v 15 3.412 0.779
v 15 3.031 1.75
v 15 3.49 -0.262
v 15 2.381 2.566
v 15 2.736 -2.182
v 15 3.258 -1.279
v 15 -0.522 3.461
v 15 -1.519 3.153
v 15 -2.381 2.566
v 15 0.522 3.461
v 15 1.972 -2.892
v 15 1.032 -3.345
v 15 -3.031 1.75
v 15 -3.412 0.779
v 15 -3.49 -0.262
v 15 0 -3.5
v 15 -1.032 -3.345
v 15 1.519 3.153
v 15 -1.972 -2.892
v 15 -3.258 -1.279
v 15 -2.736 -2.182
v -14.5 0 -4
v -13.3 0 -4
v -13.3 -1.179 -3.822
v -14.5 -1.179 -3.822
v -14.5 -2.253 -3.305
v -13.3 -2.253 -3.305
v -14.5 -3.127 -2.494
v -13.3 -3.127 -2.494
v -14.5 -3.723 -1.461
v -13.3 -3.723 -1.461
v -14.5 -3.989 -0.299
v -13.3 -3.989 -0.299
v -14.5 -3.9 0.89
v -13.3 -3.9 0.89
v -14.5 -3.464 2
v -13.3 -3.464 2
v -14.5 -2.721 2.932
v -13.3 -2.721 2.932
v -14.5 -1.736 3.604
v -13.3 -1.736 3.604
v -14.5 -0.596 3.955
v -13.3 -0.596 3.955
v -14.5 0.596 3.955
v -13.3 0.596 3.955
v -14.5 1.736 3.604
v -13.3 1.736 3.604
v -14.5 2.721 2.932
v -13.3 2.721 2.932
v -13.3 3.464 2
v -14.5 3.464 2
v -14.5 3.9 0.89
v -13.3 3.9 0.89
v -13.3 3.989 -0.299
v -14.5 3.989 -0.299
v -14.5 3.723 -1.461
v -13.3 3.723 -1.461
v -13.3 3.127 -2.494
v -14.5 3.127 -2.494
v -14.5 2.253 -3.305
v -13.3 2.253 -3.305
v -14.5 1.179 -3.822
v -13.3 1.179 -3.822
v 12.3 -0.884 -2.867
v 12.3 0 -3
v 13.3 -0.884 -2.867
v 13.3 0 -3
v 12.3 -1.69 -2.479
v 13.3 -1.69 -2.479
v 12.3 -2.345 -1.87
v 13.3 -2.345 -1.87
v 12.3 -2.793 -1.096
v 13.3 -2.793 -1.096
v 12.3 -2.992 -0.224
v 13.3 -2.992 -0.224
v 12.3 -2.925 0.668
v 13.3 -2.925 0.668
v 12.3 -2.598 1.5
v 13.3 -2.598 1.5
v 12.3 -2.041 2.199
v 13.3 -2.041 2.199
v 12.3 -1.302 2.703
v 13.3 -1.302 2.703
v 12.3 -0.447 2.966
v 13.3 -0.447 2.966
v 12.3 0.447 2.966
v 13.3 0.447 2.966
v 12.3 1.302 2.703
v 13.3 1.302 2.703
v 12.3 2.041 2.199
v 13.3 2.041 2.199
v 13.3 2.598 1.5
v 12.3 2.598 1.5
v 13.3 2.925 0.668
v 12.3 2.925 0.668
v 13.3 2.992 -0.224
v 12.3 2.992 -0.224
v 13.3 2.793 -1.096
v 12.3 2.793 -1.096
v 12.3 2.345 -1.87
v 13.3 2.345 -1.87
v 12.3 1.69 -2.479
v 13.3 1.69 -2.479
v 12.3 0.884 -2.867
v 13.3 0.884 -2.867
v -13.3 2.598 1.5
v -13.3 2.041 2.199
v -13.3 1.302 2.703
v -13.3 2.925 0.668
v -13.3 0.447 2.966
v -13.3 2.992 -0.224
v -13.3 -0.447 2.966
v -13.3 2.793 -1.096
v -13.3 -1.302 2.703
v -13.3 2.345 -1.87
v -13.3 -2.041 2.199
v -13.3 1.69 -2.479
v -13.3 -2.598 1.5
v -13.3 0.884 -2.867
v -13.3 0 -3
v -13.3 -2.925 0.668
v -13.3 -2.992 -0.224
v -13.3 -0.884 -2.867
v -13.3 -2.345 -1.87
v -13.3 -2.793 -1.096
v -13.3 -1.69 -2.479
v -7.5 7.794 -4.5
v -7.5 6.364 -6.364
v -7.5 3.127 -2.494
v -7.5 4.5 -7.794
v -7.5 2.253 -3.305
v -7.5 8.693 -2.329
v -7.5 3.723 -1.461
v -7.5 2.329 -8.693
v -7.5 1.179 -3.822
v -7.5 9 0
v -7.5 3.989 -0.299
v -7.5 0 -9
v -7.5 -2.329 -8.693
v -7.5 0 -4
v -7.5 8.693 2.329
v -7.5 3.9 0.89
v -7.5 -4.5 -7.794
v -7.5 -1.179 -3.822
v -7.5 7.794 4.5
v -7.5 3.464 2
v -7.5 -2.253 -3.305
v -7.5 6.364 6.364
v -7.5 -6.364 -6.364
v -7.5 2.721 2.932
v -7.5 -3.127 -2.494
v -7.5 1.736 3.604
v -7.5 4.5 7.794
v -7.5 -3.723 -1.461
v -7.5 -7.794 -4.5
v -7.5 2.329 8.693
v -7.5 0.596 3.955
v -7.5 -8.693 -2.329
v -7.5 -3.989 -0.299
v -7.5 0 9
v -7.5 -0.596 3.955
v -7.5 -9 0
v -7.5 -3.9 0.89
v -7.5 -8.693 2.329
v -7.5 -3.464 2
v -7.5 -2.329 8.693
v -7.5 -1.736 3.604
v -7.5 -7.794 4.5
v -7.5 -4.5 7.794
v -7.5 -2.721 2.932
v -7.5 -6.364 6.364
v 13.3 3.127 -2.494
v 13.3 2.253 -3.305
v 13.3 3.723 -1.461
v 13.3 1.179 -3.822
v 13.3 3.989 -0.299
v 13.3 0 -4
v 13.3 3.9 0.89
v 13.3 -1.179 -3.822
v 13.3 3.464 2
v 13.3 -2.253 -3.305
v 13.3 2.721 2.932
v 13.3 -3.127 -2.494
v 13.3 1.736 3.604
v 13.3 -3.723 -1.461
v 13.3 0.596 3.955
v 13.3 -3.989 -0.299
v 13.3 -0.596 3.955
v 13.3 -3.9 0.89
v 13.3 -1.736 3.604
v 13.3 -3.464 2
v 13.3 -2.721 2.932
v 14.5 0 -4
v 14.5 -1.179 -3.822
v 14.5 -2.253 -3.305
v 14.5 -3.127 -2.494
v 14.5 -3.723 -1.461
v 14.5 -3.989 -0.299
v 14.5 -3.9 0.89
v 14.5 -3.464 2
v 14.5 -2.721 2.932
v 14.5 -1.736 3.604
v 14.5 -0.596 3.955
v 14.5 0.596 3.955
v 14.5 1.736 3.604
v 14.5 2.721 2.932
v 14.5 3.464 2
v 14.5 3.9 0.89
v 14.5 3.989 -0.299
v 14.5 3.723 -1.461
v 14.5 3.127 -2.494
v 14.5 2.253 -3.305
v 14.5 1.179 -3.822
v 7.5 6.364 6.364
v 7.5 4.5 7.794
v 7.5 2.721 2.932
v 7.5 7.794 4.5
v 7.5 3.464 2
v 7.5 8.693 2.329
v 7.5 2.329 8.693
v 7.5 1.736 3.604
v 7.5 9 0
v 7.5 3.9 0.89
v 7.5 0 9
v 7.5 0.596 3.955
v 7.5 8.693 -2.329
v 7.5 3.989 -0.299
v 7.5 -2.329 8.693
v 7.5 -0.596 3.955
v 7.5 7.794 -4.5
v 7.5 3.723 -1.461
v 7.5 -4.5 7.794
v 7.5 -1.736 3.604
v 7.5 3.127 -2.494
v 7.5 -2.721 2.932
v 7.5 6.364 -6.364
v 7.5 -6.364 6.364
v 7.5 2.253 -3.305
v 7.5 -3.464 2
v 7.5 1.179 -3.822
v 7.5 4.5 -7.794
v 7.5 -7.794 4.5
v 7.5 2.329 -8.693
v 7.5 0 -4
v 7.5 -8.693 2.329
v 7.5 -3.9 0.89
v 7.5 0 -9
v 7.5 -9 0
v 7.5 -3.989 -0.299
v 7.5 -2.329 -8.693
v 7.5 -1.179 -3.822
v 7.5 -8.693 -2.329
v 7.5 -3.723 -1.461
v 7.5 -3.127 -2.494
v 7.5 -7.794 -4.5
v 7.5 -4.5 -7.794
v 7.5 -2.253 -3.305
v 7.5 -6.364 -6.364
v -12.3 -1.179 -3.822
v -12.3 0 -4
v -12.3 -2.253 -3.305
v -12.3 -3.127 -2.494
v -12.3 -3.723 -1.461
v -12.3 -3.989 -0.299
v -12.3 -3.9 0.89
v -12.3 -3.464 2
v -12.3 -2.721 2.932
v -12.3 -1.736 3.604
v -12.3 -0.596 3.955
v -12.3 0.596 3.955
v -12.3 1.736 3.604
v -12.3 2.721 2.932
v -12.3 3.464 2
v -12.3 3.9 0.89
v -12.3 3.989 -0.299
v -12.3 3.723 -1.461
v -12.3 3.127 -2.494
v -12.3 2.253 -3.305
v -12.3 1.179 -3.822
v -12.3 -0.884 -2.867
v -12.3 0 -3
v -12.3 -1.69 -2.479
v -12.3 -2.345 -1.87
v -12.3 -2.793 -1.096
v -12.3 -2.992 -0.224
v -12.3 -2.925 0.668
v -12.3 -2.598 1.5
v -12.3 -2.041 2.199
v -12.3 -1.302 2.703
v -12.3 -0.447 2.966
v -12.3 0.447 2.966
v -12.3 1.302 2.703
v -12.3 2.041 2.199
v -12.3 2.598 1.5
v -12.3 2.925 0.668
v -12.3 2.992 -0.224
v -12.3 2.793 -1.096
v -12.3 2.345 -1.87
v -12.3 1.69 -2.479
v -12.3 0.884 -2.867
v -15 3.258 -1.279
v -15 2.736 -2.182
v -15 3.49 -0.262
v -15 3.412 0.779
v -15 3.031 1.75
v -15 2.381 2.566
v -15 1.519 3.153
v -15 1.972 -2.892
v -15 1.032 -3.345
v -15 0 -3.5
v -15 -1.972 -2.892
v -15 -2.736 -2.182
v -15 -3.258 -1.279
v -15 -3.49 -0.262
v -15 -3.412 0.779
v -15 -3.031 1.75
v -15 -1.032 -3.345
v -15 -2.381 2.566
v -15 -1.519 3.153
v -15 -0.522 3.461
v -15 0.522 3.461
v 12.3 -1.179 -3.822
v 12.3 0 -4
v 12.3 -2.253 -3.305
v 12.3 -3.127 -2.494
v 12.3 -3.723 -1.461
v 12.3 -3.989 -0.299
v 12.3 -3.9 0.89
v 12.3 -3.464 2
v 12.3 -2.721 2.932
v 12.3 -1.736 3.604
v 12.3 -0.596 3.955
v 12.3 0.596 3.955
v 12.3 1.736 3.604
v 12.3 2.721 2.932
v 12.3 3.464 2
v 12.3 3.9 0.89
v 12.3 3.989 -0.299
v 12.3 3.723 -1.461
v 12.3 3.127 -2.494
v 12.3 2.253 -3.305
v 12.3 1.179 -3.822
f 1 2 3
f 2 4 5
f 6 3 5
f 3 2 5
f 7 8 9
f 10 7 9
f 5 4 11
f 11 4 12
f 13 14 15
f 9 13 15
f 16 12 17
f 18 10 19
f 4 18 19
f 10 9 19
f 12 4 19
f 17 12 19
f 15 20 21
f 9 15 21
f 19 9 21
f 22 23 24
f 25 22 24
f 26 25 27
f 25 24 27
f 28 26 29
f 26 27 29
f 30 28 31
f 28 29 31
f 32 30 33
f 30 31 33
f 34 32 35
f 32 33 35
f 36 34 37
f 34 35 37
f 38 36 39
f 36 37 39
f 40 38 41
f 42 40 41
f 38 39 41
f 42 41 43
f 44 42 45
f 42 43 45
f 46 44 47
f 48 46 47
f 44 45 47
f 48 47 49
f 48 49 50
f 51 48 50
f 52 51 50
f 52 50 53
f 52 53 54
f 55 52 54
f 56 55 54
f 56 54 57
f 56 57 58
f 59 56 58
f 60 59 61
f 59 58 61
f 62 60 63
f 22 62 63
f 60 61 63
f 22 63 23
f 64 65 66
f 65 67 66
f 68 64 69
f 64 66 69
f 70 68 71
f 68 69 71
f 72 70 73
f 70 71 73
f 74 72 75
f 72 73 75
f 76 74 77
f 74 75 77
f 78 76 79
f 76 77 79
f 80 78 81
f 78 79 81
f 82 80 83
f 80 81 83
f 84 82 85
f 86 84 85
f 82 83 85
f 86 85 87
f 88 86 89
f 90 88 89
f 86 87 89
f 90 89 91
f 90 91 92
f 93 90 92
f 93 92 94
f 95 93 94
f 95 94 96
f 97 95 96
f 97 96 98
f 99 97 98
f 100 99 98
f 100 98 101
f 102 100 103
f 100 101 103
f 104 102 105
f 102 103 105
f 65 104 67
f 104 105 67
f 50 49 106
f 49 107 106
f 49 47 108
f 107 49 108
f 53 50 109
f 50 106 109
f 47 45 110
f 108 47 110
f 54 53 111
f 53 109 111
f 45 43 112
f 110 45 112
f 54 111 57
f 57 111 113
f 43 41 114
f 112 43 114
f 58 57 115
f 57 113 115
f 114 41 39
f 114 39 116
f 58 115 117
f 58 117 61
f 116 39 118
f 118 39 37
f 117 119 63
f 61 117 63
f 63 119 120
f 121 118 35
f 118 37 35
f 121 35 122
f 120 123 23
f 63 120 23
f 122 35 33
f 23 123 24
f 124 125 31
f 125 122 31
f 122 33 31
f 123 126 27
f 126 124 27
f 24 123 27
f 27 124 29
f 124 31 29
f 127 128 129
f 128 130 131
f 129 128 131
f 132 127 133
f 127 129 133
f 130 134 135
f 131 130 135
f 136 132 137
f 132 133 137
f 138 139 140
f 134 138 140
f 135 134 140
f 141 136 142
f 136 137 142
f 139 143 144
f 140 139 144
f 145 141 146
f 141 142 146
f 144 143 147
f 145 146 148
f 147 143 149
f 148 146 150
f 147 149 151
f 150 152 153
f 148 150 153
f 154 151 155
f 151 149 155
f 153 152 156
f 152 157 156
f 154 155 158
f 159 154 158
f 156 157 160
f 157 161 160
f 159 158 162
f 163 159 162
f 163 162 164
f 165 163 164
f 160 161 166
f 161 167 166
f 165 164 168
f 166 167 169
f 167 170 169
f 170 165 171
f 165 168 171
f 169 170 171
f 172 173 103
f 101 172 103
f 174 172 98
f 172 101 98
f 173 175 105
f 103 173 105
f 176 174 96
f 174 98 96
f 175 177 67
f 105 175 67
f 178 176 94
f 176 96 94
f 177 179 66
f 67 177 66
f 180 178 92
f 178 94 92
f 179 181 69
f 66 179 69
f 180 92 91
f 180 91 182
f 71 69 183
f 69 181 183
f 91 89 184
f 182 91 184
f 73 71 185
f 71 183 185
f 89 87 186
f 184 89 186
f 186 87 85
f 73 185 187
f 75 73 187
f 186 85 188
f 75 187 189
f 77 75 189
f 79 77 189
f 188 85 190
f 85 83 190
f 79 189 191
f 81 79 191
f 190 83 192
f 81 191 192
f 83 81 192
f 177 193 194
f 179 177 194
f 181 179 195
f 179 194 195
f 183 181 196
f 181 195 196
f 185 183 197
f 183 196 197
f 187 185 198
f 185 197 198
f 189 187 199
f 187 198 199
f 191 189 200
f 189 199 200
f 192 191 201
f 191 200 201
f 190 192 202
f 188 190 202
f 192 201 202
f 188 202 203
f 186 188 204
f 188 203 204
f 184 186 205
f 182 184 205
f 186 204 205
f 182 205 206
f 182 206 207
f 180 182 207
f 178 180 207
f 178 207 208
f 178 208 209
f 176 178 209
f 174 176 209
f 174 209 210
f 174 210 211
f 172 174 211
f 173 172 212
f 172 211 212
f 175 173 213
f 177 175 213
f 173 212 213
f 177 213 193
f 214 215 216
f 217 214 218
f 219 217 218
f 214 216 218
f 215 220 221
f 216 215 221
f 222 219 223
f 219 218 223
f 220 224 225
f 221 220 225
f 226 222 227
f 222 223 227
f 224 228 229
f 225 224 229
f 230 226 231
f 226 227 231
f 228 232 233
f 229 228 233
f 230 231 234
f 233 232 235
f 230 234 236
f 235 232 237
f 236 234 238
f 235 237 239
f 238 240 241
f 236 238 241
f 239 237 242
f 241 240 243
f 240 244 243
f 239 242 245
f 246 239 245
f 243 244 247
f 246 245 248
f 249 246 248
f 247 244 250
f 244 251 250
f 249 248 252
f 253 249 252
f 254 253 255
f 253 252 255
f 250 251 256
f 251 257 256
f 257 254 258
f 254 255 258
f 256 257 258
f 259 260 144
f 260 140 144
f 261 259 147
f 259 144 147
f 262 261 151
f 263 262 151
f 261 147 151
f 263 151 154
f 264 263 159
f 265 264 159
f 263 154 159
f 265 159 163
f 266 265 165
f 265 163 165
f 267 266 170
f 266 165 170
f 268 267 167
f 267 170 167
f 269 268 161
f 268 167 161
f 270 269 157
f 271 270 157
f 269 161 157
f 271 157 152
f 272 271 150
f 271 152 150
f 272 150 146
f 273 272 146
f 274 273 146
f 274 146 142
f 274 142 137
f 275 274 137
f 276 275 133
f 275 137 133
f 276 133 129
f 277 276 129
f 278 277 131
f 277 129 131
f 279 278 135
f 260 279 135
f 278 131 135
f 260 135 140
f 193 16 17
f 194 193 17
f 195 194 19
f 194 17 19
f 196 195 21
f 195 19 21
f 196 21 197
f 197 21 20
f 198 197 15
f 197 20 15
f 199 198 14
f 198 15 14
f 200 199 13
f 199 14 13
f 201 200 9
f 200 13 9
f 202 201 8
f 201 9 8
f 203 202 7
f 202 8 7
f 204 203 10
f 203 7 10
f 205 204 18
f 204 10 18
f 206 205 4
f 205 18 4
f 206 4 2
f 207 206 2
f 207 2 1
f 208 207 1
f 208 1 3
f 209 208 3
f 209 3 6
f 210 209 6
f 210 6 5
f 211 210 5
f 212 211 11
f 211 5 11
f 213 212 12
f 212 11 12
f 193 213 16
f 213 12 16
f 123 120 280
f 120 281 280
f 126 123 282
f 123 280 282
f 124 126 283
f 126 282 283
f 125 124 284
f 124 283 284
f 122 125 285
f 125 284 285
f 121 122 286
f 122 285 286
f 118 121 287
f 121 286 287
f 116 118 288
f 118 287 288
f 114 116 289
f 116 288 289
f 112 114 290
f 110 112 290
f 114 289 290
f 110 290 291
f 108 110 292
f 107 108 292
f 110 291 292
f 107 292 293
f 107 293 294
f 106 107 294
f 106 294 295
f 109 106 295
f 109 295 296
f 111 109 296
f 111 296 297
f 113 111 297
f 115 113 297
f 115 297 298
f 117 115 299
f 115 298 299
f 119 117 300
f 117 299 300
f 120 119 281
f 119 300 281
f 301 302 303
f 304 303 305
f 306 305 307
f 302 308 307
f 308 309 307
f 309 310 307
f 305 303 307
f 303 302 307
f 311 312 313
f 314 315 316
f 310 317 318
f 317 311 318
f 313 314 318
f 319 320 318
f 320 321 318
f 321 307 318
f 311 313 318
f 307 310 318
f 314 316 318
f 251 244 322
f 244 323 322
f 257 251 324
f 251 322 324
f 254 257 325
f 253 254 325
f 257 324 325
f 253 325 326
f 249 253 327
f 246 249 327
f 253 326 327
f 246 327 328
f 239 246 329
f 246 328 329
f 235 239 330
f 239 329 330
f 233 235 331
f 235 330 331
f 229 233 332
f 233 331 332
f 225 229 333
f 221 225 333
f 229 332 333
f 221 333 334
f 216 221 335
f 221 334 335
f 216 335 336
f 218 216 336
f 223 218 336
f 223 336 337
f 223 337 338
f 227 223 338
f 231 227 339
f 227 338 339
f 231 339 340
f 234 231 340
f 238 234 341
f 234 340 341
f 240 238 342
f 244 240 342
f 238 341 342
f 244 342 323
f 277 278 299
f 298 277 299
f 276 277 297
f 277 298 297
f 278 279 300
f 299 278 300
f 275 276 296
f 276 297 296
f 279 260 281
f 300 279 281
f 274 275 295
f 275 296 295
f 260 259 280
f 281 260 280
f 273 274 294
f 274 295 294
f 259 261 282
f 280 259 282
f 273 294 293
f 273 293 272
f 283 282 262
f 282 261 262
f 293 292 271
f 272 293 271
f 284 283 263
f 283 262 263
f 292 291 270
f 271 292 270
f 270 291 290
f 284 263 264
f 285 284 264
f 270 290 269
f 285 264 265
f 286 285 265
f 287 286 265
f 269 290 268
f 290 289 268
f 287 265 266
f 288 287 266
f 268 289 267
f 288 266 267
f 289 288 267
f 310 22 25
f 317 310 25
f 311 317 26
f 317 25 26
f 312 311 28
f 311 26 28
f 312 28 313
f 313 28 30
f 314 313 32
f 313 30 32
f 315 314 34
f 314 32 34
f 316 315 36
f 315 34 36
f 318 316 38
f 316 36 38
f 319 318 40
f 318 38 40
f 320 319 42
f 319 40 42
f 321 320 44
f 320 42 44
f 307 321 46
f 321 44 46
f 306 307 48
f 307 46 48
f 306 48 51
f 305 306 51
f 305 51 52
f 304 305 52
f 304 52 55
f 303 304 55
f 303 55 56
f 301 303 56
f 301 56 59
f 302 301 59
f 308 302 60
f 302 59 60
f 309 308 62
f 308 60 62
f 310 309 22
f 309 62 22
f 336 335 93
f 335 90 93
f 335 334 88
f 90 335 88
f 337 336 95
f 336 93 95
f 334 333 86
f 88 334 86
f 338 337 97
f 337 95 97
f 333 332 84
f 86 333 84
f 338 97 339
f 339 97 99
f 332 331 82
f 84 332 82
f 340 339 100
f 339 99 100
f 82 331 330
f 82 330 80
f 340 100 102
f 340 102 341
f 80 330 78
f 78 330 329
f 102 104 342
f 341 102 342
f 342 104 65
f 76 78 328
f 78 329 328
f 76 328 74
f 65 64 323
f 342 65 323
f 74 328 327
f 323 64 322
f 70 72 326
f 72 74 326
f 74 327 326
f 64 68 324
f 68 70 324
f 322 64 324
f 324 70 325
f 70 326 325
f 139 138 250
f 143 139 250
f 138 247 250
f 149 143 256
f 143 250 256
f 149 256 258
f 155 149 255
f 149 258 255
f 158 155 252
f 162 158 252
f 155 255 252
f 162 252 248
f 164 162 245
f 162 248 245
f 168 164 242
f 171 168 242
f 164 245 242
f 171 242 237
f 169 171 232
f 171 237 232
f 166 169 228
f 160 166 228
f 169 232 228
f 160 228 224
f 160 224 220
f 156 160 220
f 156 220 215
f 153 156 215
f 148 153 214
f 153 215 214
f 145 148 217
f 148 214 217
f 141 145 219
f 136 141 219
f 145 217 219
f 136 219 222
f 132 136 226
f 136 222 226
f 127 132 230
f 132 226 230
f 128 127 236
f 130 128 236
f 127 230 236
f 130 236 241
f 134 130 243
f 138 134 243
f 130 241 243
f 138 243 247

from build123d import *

# Parameters (mm, degrees)
F2_SIZE2 = 0.5
F2_SIZE  = 0.5


with BuildPart() as f1:
    # F0 (on Front) → F1 (revolve)
    with BuildSketch(Plane.XZ):
        Polygon((15, 0), (-15, 0), (-15, -4), (-13.3, -4), (-13.3, -3), (-12.3, -3), (-12.3, -4), (-7.5, -4), (-7.5, -9), (7.5, -9), (7.5, -4), (12.3, -4), (12.3, -3), (13.3, -3), (13.3, -4), (15, -4), align=None)
    revolve(axis=Axis((-12.237907, 0, 0), (-1, 0, 0)))

    # F2
    f2_edges = [f1.edges().sort_by_distance(p)[0] for p in [
        (15, 0, 4),
        (-15, 0, 4),
    ]]
    chamfer(f2_edges, length=F2_SIZE, length2=F2_SIZE2)


solid = f1.part
